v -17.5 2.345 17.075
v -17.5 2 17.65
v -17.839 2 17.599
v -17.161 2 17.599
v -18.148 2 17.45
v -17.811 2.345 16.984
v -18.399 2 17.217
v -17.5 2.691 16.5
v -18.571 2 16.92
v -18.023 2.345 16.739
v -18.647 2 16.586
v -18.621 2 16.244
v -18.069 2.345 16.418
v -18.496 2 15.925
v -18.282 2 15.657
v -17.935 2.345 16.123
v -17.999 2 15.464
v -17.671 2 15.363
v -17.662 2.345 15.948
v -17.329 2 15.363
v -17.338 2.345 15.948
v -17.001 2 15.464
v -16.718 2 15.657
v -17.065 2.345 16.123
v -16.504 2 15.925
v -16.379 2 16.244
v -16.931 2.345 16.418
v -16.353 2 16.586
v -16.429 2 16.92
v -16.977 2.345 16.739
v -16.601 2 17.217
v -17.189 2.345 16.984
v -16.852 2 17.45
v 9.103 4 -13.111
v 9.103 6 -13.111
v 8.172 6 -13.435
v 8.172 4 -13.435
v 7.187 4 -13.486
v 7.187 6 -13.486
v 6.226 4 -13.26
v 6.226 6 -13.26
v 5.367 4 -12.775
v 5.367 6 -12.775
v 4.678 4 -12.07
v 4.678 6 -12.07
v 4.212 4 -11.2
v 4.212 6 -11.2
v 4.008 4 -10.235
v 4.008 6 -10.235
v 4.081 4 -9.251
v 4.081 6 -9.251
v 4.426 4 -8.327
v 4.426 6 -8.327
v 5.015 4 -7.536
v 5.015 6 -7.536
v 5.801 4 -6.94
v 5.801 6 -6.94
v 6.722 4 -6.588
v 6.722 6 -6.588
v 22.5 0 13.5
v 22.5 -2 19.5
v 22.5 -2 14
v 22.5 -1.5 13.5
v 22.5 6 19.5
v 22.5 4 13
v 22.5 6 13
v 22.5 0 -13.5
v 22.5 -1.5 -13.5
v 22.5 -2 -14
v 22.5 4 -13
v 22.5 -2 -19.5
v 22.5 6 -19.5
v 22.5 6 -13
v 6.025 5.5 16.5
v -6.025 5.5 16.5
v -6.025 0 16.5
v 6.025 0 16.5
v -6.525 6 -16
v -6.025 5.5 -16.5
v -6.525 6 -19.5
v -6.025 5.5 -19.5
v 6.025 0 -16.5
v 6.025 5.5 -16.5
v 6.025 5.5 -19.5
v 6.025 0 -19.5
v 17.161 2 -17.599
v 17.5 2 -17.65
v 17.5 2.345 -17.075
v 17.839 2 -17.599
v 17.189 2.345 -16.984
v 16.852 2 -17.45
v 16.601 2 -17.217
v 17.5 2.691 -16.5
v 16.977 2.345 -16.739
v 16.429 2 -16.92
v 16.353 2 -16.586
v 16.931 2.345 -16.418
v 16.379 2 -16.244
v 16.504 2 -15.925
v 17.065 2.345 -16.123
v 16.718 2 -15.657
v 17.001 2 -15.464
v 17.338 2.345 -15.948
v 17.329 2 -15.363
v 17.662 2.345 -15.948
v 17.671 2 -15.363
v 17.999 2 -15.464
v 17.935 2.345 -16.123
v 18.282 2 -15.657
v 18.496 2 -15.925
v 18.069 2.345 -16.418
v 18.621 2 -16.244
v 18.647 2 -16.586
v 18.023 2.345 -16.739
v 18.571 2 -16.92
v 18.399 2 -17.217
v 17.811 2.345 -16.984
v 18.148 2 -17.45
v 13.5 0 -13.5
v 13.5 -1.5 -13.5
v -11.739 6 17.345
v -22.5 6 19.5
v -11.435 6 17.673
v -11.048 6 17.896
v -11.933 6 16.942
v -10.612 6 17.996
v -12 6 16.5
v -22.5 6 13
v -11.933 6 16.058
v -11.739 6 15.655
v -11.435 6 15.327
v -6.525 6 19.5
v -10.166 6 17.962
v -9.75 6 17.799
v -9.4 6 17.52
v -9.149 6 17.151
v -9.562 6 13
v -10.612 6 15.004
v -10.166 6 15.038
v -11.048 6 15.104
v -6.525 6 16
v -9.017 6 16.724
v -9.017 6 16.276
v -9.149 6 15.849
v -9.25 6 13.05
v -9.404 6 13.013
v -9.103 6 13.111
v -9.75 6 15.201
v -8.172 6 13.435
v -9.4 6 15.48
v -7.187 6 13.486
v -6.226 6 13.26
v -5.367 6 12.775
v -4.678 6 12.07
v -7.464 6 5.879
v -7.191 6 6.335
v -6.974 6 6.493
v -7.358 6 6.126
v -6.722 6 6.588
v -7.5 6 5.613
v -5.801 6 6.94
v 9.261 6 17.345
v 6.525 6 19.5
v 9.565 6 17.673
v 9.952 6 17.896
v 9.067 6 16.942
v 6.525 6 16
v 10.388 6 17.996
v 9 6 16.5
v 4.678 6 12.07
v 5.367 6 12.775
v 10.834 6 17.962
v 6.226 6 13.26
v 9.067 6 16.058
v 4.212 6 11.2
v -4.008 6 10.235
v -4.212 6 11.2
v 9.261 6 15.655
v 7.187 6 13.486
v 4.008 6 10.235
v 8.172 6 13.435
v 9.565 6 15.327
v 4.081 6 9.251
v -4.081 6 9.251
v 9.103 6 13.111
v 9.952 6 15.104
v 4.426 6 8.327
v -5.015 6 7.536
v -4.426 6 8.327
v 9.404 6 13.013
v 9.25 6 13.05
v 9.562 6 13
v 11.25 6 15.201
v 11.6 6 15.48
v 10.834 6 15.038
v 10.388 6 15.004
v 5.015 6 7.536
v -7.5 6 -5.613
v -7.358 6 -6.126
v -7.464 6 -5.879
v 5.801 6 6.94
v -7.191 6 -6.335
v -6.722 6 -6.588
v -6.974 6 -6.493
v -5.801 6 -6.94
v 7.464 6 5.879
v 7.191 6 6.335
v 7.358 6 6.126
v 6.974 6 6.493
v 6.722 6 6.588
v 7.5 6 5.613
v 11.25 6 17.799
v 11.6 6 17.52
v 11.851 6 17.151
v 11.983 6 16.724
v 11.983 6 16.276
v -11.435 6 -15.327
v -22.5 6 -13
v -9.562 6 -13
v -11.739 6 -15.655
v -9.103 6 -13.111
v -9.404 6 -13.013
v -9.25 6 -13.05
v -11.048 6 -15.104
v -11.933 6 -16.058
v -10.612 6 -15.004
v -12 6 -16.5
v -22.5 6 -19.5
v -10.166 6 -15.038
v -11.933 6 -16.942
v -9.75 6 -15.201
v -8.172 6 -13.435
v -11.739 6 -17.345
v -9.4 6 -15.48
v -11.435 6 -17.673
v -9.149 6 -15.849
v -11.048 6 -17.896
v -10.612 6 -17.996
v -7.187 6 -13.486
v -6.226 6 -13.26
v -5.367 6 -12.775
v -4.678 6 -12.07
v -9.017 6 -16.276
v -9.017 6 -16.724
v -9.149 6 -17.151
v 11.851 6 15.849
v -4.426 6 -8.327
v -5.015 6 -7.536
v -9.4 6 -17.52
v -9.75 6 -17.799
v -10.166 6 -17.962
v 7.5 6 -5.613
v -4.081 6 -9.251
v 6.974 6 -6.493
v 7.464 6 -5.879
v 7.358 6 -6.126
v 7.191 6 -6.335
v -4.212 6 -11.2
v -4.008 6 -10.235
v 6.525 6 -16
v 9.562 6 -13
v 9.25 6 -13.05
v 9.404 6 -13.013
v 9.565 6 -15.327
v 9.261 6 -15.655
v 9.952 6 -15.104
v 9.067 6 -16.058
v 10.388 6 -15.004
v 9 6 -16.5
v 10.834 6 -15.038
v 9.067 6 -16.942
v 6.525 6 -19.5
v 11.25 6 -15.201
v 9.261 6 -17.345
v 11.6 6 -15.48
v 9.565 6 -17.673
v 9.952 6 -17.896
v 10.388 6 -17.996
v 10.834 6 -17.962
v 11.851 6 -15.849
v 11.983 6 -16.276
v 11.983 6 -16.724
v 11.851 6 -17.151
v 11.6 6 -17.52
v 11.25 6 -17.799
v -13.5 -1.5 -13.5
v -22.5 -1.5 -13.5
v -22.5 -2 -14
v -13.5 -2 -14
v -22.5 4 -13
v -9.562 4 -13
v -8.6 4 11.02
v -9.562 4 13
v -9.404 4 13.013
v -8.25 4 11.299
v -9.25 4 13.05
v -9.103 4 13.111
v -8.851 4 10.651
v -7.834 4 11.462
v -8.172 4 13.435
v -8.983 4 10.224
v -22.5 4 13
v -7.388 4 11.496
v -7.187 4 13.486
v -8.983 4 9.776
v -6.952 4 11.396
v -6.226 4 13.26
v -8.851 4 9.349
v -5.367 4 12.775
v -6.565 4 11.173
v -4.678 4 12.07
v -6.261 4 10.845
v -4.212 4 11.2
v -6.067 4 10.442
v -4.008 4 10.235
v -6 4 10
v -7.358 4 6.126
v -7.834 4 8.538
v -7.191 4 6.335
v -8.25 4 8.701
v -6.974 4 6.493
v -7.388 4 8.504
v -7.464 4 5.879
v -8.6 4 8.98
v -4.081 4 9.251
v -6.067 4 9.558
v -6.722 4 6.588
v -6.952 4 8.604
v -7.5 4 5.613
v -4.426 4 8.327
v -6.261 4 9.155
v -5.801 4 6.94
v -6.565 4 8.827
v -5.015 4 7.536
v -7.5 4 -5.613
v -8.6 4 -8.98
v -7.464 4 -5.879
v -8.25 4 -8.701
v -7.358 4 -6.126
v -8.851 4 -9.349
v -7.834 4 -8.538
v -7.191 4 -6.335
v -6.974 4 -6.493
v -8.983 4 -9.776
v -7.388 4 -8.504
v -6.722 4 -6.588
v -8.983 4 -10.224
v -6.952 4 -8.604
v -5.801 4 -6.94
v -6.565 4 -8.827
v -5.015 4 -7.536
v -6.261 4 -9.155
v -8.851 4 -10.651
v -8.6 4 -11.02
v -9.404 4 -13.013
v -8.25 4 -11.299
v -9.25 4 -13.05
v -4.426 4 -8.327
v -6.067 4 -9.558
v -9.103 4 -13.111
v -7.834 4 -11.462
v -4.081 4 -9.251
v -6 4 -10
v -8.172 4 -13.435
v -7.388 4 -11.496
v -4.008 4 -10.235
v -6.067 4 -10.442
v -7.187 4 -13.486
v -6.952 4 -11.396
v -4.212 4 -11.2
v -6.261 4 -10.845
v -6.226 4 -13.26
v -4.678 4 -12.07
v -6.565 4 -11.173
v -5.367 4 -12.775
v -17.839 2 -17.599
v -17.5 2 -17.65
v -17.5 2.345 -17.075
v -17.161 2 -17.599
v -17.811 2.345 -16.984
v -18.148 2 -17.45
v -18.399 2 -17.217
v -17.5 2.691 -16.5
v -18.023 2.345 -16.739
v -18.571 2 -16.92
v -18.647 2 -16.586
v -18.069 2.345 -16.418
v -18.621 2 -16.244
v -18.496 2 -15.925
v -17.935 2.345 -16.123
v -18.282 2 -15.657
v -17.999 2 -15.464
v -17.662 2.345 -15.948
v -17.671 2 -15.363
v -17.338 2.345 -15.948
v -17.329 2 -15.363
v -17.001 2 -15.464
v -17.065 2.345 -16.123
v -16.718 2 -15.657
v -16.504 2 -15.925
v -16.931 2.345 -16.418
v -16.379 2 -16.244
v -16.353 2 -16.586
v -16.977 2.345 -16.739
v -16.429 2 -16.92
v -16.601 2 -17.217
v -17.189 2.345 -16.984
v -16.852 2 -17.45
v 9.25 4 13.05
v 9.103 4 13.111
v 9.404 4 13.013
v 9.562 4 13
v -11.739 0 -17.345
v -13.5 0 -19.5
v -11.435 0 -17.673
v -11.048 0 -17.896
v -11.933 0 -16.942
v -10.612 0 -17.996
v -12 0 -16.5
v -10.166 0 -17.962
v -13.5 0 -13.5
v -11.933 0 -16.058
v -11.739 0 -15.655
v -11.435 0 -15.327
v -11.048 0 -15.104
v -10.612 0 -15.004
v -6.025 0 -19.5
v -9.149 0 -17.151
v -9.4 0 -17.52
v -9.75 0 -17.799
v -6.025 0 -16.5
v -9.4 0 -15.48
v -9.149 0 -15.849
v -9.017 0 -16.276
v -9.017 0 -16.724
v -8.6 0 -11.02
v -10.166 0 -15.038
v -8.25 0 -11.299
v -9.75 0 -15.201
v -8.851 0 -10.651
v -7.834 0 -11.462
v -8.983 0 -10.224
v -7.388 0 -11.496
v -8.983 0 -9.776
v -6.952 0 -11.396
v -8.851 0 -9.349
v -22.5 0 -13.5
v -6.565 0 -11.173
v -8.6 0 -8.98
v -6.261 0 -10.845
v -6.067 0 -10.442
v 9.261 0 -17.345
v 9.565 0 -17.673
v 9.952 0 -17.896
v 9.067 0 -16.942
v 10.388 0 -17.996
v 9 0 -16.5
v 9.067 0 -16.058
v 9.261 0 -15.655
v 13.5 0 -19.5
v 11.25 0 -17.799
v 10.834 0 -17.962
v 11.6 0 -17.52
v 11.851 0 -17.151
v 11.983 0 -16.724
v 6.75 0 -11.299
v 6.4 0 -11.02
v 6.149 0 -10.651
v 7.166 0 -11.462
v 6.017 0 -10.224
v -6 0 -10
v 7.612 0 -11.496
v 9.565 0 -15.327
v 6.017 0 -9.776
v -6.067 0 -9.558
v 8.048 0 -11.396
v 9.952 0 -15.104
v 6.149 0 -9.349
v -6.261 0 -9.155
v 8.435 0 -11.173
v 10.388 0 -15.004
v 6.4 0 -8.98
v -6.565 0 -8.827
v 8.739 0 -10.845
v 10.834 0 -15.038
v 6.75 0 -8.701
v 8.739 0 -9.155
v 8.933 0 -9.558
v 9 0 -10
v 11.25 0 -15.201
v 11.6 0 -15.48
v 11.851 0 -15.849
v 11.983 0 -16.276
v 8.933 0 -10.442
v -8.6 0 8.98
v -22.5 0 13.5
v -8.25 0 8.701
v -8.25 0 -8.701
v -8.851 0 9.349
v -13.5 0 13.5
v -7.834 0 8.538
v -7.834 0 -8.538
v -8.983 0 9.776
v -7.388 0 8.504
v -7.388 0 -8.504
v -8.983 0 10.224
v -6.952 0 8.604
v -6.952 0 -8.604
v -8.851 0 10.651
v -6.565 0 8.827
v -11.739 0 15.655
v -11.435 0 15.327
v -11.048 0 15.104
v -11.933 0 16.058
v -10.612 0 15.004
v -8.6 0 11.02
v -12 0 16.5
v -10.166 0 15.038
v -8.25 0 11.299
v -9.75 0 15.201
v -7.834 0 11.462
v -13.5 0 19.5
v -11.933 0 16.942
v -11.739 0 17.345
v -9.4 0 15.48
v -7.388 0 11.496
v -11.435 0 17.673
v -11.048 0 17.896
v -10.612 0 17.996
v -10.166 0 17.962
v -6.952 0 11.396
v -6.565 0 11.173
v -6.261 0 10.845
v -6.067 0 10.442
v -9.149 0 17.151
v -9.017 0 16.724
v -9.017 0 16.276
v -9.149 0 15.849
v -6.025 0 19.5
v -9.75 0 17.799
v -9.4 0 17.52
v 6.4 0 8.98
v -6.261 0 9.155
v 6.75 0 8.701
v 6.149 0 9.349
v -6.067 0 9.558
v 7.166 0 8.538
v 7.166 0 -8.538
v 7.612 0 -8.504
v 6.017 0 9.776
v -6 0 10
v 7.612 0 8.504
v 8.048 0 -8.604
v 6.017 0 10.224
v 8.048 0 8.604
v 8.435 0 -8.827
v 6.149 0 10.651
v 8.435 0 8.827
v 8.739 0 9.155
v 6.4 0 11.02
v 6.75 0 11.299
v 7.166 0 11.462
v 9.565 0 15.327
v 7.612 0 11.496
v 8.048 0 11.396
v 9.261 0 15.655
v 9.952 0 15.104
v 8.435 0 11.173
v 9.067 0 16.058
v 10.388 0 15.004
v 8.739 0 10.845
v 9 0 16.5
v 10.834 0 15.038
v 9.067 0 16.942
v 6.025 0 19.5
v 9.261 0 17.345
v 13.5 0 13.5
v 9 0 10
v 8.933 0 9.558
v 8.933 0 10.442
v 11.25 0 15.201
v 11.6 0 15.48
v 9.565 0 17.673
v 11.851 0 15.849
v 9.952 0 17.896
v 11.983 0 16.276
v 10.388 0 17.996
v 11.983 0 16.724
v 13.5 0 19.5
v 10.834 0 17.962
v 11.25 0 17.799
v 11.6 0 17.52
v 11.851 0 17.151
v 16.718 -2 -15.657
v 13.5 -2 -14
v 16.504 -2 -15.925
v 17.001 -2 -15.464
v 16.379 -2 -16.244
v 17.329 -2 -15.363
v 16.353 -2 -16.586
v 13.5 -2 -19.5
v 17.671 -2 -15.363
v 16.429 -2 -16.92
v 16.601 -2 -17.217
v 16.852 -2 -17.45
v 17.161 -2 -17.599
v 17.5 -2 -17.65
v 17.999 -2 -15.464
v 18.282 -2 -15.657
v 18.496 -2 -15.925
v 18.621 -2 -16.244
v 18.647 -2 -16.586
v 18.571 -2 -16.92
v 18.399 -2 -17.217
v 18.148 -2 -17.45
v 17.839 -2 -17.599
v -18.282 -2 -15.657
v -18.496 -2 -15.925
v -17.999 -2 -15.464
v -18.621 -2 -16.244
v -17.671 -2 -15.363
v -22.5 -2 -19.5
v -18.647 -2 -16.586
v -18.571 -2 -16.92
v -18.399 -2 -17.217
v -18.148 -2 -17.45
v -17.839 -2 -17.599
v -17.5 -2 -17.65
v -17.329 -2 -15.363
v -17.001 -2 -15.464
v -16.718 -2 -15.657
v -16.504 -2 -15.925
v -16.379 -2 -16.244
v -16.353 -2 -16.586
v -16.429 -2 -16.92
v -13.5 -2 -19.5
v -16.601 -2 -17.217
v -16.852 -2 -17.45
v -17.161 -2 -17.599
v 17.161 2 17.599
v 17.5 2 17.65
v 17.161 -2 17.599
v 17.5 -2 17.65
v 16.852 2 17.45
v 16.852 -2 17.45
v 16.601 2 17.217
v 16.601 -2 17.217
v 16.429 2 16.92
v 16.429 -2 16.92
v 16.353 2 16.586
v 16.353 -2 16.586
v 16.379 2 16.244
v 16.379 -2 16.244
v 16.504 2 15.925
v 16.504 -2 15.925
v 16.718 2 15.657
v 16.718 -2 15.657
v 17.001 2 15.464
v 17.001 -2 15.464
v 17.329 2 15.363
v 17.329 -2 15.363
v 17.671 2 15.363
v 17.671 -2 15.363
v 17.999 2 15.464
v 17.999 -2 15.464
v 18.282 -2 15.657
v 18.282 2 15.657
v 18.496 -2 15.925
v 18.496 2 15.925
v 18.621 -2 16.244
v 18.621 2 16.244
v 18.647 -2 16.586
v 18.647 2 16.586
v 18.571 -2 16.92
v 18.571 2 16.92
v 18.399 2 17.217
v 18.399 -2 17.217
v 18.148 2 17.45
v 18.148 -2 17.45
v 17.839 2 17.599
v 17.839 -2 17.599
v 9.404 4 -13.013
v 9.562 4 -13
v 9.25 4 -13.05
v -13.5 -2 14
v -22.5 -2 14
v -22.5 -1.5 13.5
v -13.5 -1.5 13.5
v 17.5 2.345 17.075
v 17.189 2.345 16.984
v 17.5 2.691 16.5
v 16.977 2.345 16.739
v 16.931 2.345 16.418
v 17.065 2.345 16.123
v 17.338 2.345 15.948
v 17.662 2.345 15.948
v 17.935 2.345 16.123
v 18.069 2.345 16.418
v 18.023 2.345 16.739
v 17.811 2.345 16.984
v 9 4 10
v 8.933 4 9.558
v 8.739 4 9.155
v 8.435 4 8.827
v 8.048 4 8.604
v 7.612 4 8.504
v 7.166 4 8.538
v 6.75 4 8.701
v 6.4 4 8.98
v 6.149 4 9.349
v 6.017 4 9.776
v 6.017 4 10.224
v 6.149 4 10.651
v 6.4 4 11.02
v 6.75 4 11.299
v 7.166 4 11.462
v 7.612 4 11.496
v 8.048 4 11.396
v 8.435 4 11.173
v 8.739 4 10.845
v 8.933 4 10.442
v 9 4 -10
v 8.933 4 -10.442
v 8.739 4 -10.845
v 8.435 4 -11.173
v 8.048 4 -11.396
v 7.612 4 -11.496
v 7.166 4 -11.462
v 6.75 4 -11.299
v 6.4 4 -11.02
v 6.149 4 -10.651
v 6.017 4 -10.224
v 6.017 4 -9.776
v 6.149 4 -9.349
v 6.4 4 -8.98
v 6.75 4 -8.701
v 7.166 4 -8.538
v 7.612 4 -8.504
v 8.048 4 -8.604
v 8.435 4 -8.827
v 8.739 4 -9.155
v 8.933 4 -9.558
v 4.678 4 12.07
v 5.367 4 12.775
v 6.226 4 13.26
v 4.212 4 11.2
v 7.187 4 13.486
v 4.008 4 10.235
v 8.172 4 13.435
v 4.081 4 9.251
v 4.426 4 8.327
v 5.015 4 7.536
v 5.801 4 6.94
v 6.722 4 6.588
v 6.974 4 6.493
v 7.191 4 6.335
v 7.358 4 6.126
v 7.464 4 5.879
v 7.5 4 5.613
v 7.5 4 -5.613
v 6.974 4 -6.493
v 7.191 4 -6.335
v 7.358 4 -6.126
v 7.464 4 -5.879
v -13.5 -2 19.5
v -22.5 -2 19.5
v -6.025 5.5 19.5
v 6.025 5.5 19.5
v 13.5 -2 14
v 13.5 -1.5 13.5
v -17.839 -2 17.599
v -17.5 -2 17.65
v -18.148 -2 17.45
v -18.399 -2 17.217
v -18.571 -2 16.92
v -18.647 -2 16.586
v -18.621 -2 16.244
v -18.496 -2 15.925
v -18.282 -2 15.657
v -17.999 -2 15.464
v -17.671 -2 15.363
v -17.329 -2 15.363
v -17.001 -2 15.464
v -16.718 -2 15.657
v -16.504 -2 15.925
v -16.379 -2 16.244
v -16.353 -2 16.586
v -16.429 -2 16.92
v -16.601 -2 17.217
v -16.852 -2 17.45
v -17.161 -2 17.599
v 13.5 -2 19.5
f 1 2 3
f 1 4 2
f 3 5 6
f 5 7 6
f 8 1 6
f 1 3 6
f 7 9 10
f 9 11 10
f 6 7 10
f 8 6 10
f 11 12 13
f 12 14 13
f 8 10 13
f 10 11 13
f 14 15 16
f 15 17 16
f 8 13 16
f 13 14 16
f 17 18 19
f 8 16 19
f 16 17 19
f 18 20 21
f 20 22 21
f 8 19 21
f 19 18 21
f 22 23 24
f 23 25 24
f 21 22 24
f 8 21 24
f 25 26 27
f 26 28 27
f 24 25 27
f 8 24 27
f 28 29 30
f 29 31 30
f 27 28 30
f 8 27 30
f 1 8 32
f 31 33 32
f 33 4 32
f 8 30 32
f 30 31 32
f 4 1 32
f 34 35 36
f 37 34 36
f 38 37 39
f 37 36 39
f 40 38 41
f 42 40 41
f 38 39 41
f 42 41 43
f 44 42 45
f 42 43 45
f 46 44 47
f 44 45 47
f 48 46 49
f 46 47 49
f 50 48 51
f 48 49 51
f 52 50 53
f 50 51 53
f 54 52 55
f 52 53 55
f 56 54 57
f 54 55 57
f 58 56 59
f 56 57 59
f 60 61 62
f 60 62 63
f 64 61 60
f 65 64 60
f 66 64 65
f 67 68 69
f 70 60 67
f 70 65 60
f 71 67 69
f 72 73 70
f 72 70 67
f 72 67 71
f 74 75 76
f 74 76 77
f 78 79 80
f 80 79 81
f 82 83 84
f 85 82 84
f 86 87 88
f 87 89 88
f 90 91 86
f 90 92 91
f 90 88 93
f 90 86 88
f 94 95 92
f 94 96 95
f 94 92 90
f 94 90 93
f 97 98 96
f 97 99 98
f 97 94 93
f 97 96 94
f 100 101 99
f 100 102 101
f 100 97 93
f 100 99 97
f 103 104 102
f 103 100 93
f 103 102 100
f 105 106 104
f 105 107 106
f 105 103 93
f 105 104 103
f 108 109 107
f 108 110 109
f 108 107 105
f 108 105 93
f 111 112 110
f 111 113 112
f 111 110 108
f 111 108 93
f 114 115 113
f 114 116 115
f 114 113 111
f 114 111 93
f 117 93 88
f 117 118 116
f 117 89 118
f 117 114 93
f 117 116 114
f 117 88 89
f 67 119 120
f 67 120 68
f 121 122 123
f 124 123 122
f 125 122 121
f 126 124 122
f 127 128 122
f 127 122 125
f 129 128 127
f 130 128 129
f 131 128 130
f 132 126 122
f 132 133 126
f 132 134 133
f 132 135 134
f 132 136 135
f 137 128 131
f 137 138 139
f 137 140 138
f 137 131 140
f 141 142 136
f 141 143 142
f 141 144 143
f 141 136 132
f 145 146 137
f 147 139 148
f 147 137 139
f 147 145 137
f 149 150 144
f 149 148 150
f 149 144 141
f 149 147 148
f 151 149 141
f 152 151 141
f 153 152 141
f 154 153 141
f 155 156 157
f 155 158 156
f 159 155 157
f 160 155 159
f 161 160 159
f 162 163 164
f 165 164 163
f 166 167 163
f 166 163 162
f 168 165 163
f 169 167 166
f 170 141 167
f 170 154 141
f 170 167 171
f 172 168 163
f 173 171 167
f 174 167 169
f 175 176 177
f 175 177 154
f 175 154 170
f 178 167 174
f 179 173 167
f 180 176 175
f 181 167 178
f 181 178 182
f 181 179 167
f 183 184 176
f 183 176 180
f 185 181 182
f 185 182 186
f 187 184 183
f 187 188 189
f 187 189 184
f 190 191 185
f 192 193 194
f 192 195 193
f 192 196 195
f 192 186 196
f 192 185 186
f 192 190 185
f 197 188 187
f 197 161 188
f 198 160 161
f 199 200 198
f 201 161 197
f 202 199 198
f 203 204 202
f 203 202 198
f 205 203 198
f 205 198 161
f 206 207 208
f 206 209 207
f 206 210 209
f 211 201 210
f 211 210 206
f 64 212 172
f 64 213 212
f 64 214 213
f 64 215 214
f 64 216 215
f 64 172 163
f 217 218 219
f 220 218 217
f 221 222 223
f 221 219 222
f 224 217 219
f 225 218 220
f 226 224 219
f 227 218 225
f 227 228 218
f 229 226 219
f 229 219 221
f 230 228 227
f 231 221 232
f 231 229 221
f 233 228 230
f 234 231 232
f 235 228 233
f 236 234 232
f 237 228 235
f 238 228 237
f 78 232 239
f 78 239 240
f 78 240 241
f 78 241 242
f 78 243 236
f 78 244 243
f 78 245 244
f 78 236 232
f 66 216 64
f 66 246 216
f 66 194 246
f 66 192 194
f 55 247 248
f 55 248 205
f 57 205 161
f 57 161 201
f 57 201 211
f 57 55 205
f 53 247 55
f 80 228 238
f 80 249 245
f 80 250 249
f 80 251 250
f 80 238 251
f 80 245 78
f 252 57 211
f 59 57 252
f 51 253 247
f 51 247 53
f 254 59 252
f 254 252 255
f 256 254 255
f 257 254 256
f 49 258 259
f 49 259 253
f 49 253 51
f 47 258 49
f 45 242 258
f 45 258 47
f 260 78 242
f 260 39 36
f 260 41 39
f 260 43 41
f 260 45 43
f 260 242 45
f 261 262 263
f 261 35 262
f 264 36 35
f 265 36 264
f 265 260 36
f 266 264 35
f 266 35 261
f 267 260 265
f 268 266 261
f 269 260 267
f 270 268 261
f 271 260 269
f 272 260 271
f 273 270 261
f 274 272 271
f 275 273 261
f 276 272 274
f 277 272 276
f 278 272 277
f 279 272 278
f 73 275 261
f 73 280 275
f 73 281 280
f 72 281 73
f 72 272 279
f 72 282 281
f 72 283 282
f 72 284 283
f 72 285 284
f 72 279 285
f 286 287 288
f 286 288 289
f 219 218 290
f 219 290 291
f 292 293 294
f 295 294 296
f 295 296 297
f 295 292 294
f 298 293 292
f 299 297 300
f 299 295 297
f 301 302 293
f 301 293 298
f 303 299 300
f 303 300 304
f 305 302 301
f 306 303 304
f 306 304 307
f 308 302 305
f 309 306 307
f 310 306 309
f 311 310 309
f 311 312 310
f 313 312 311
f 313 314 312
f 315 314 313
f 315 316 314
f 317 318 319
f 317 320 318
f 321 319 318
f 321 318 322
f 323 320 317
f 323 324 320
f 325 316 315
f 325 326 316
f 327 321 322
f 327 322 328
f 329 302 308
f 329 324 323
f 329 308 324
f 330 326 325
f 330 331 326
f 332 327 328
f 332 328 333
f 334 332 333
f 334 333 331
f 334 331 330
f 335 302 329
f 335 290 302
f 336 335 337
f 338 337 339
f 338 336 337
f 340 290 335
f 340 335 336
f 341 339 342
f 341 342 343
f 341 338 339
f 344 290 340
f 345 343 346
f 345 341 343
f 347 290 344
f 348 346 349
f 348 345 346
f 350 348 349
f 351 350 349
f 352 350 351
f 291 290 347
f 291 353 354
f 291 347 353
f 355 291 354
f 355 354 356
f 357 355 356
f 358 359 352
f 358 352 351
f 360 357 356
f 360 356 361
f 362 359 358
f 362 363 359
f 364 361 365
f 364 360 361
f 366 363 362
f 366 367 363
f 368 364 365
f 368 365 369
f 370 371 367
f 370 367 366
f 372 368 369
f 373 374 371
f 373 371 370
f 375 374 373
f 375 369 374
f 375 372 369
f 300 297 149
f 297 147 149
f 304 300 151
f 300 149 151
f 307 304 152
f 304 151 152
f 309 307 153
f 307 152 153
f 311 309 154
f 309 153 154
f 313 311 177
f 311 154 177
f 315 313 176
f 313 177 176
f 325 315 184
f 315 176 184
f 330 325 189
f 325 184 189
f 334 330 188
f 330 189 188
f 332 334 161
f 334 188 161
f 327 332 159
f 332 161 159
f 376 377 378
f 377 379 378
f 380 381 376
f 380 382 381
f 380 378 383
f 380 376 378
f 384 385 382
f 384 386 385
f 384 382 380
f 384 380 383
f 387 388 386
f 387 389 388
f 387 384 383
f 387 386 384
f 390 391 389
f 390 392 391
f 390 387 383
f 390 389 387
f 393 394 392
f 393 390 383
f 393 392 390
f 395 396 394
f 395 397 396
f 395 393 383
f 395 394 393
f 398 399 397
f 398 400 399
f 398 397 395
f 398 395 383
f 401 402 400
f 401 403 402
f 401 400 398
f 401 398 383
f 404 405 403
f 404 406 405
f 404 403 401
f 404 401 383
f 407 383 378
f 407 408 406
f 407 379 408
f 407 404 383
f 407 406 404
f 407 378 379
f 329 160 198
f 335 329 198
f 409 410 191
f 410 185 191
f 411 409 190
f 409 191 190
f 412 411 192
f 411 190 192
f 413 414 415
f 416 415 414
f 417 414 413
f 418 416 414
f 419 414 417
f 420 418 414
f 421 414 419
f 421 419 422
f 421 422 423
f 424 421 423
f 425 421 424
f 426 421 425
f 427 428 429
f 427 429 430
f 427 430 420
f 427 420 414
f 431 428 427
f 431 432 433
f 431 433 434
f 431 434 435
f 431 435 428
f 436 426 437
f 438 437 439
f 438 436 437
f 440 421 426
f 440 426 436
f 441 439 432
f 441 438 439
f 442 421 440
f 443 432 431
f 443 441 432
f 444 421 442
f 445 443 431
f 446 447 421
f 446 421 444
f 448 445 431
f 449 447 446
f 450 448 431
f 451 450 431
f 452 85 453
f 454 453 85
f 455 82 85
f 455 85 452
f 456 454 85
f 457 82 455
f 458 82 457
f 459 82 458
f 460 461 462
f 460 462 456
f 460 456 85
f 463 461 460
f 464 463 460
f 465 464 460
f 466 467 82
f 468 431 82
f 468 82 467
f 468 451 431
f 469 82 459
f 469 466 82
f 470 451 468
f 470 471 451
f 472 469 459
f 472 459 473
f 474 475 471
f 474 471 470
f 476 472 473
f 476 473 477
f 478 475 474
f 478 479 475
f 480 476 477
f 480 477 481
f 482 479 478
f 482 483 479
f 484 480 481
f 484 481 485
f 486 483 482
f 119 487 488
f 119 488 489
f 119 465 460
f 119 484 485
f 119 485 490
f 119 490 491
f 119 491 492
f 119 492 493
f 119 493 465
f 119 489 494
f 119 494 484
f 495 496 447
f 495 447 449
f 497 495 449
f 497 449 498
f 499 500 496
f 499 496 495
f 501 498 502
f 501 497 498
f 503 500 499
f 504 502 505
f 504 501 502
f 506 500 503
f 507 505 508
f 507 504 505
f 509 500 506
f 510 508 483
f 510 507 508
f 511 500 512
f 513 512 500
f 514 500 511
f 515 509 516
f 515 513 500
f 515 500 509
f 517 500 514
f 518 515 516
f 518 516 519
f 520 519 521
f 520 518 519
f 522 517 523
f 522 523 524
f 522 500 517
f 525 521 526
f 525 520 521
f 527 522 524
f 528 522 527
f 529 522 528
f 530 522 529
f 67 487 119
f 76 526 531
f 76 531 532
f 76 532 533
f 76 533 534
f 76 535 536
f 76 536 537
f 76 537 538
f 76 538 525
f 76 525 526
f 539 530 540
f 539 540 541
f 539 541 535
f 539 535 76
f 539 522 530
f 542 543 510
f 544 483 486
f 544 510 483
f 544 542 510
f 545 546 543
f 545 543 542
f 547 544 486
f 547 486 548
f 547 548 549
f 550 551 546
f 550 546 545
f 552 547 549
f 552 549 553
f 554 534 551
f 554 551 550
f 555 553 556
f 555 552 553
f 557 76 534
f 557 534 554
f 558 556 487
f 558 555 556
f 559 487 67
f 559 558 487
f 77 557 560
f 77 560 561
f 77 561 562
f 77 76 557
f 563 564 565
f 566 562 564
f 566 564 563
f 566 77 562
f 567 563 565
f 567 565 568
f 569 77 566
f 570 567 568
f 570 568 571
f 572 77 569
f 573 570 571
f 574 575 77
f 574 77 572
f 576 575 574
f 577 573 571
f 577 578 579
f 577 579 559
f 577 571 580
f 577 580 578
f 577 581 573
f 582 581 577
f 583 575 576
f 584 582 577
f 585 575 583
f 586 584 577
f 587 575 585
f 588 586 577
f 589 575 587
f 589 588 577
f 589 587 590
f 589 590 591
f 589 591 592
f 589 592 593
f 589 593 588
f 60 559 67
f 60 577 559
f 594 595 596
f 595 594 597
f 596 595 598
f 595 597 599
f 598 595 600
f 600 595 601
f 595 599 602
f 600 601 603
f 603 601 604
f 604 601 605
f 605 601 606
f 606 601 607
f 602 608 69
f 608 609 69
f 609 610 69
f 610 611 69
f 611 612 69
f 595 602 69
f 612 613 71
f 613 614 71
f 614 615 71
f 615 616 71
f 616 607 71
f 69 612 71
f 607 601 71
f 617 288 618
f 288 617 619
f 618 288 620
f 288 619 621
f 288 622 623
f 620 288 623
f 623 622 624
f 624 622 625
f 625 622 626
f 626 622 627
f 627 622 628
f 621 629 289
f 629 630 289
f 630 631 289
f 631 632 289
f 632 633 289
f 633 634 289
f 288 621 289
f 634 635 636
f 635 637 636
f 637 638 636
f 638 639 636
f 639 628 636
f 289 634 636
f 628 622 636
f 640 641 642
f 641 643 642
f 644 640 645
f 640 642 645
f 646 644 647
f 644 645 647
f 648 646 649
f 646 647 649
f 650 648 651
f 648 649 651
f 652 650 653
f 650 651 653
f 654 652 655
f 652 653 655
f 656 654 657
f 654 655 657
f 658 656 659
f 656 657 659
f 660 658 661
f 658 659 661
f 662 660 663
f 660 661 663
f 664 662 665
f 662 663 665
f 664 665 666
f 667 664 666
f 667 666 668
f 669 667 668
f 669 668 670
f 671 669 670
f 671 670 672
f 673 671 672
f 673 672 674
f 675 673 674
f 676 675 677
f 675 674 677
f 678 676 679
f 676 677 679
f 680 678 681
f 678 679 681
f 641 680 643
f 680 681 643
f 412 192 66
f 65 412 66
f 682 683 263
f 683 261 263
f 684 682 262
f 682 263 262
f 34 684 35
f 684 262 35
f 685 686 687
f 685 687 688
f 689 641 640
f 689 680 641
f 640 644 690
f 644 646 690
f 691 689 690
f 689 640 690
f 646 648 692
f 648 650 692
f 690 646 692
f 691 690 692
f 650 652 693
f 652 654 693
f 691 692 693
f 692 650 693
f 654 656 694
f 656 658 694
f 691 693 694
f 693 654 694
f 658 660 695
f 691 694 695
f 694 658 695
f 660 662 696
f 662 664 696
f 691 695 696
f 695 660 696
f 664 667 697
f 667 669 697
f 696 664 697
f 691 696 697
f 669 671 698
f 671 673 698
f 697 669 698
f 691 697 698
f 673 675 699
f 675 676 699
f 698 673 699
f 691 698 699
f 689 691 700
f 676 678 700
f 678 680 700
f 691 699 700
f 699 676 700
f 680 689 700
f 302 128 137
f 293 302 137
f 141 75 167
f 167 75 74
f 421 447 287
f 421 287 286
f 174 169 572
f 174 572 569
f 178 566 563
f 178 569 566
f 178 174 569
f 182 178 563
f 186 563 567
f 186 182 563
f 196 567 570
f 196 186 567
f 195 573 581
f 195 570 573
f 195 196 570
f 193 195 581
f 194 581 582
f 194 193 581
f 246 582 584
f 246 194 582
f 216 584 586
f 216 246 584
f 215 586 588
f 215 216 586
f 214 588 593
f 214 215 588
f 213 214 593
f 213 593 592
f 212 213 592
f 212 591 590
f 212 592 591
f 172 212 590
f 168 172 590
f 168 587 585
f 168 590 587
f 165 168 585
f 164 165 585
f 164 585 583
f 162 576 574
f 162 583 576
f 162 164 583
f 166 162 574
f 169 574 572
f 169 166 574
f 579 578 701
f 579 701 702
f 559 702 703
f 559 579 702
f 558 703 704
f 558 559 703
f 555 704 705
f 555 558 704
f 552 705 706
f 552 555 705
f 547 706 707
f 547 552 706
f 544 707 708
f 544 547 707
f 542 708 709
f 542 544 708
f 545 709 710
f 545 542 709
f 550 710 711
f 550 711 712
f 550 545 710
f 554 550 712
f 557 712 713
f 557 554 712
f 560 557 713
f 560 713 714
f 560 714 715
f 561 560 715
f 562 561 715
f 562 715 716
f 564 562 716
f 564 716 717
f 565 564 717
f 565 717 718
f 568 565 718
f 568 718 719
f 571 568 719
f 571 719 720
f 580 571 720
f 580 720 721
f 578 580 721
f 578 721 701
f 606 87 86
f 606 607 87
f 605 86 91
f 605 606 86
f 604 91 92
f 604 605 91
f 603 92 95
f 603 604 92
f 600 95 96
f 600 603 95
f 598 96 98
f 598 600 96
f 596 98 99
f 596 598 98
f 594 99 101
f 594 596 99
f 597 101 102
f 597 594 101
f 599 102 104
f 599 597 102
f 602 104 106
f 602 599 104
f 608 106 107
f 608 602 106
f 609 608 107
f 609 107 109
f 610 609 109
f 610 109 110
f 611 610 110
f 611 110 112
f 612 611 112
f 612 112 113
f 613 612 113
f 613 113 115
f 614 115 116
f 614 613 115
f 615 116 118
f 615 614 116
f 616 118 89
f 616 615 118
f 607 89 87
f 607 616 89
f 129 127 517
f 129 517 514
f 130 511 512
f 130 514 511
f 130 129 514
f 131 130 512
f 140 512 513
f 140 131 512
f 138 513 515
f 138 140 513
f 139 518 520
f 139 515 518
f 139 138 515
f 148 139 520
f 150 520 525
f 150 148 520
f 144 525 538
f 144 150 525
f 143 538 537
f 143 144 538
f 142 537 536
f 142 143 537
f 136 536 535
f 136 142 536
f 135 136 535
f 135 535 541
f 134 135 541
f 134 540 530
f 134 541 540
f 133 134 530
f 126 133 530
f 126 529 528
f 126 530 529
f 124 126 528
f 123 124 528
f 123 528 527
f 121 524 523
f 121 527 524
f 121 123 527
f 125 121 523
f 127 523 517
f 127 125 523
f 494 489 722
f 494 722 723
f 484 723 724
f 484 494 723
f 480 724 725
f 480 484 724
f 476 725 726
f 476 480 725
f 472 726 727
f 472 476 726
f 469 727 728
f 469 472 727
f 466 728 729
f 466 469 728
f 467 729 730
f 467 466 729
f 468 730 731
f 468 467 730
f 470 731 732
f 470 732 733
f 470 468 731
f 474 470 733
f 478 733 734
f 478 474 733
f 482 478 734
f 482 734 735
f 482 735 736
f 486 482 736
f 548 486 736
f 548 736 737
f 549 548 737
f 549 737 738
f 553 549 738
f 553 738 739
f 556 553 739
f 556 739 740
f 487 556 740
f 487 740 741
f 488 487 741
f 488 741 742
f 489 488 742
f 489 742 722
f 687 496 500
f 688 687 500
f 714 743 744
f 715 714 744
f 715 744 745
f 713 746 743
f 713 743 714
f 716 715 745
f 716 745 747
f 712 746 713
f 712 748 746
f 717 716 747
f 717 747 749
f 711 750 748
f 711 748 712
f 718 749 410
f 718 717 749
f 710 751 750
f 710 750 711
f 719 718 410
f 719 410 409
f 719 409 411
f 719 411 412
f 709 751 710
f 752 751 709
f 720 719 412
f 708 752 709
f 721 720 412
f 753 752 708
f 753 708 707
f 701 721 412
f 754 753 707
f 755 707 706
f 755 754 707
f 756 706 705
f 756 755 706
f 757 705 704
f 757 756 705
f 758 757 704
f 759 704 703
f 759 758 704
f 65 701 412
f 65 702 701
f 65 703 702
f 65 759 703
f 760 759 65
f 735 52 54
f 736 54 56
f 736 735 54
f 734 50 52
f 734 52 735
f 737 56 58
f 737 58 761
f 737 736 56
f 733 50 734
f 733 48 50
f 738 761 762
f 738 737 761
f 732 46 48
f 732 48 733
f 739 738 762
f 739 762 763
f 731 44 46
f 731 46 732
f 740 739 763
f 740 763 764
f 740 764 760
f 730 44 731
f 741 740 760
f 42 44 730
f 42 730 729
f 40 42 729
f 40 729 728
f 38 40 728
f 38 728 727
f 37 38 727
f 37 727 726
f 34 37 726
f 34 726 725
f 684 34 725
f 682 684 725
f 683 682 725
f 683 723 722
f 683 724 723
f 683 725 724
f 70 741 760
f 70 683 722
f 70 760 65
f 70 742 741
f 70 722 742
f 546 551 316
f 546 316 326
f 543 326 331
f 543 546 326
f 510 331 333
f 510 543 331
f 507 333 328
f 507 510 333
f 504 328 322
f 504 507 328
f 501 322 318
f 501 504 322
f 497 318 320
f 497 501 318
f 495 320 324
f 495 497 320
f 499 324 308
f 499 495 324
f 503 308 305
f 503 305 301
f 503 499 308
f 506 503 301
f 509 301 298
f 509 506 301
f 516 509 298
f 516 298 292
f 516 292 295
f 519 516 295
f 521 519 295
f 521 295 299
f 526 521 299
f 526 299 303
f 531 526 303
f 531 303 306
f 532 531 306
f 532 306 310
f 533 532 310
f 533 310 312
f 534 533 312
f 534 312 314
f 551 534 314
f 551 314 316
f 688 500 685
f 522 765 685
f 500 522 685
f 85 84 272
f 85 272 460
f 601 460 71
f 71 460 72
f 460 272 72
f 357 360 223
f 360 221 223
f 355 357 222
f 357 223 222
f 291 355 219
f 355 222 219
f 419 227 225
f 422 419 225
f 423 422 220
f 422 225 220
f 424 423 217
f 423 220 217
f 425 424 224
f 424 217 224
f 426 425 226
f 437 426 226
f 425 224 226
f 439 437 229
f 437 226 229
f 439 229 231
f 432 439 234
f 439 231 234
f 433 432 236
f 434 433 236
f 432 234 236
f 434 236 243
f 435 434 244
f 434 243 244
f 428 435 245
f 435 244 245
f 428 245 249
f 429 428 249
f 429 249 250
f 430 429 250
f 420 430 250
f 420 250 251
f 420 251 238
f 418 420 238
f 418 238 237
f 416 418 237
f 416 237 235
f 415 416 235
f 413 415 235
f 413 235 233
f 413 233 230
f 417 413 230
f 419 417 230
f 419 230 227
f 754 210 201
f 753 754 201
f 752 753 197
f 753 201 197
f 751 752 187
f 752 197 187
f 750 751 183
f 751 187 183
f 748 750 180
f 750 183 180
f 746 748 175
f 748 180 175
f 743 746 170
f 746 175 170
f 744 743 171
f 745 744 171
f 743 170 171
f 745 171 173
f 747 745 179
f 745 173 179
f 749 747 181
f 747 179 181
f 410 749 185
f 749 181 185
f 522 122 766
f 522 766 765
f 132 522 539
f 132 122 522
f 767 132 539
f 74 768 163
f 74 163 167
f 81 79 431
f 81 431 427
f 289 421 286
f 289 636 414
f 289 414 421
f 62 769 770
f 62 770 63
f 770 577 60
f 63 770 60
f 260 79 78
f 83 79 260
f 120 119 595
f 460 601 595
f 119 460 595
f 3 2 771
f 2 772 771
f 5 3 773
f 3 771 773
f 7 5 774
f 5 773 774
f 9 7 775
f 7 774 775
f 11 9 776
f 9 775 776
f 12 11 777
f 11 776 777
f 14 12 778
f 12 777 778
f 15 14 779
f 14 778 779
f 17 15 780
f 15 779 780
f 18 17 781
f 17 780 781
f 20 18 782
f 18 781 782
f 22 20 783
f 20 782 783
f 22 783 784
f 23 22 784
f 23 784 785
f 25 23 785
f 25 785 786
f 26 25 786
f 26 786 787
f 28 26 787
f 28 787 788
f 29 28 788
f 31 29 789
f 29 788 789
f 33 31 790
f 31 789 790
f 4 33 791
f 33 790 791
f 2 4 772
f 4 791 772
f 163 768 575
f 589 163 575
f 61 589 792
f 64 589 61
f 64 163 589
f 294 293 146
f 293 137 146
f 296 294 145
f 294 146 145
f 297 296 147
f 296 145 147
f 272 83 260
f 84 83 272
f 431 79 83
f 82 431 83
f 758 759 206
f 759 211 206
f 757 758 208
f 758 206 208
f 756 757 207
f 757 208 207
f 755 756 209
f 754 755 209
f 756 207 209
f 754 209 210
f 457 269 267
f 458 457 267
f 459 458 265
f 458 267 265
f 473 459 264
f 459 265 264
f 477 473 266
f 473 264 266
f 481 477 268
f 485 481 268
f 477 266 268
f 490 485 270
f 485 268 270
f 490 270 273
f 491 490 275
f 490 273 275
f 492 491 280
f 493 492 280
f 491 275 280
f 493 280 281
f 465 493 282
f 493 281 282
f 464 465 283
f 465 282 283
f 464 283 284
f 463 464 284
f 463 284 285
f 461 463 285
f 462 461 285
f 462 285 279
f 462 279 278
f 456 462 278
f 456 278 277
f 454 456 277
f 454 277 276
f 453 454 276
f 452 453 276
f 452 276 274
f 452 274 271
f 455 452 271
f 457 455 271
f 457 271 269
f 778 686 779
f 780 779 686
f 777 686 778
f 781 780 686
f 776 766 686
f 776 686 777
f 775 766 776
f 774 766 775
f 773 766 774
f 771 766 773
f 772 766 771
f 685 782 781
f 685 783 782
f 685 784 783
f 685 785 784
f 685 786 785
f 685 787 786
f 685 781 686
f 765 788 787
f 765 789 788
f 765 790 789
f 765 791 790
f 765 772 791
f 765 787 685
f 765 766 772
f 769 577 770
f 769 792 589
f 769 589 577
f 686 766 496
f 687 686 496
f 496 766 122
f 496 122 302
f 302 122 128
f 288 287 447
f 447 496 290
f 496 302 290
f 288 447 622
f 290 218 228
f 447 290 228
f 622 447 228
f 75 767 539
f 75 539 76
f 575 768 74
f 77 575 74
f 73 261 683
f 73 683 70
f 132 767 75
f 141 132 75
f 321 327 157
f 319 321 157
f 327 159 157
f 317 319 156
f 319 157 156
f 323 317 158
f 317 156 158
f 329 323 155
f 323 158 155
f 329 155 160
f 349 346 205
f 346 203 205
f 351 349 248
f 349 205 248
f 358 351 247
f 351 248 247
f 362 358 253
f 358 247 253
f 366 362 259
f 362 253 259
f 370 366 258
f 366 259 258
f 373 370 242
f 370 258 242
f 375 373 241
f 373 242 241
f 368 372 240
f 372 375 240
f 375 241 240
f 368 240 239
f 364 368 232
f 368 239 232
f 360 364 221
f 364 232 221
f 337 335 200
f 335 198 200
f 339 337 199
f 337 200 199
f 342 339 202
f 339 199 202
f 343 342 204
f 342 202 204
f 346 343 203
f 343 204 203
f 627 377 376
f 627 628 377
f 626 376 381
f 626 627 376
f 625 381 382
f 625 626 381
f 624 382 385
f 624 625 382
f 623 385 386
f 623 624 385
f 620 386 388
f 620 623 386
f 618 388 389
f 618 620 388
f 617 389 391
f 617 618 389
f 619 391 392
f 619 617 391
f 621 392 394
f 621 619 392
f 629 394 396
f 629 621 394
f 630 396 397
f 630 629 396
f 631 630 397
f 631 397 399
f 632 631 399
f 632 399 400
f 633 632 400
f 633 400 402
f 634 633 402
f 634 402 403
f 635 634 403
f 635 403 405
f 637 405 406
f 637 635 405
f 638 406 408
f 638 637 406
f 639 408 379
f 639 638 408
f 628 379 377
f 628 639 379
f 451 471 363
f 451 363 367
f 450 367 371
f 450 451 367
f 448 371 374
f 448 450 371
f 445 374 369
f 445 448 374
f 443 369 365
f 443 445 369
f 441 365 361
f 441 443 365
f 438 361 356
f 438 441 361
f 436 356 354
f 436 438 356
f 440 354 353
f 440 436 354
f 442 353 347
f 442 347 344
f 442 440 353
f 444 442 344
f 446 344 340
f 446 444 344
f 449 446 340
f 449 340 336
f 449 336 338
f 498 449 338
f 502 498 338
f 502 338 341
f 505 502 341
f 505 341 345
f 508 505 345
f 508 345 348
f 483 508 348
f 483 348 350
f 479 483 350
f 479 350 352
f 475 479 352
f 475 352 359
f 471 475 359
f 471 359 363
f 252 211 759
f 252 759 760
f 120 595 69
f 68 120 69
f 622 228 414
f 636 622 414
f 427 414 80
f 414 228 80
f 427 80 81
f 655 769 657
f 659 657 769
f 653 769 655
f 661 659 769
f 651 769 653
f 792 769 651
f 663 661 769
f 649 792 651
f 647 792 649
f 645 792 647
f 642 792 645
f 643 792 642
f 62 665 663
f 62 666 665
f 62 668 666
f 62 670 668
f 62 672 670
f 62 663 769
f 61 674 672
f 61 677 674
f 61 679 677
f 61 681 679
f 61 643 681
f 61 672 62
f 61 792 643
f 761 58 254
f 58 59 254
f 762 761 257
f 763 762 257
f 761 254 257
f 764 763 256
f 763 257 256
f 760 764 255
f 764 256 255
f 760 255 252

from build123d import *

# Parameters (mm, degrees)
SKETCH_2_W                = 45
SKETCH_2_H                = 33
SKETCH_2_R                = 1.5
EXTRUDE_1_DEPTH           = 6
SKETCH_3_W                = 45
SKETCH_3_H                = 3
EXTRUDE_2_DEPTH           = 2
SKETCH_4_R                = 3.5
CUT_EXTRUDE_1_DEPTH       = 2
SKETCH_11_W               = 45
SKETCH_11_H               = 3
EXTRUDE_4_DEPTH           = 8
CUT_EXTRUDE_2_REACH       = 10
SKETCH_9_W                = 12.05
SKETCH_9_H                = 3
CHAMFER_1_SIZE            = 0.5
SKETCH_19_W               = 6
SKETCH_19_H               = 6
CUT_EXTRUDE_4_DEPTH       = 2
HOLE_WIZARD_3_0_3_1_D     = 3
HOLE_WIZARD_3_0_3_1_DEPTH = 6.001
CHAMFER_2_SIZE            = 0.5
SKETCH_20_W               = 15
SKETCH_20_H               = 26
CUT_EXTRUDE_5_DEPTH       = 2
FILLET_1_R                = 1
SKETCH_22_W               = 15
SKETCH_22_H               = 6
CUT_EXTRUDE_6_DEPTH       = 2


with BuildPart() as part:
    # 草图2 → 凸台-拉伸1 (new body)
    with BuildSketch(Plane(origin=(0, 0, 0), x_dir=(1, 0, 0), z_dir=(0, 1, 0))):
        Rectangle(SKETCH_2_W, SKETCH_2_H)
        with Locations((-7.5, 10)):
            Circle(SKETCH_2_R, mode=Mode.SUBTRACT)
        with Locations((7.5, 10)):
            Circle(SKETCH_2_R, mode=Mode.SUBTRACT)
        with Locations((-7.5, -10)):
            Circle(SKETCH_2_R, mode=Mode.SUBTRACT)
        with Locations((7.5, -10)):
            Circle(SKETCH_2_R, mode=Mode.SUBTRACT)
    extrude(amount=EXTRUDE_1_DEPTH)

    # 草图3 → 凸台-拉伸2 (add)
    with BuildSketch(Plane.XZ):
        with Locations((0, -15)):
            Rectangle(SKETCH_3_W, SKETCH_3_H)
        with Locations((0, 15)):
            Rectangle(SKETCH_3_W, SKETCH_3_H)
    extrude(amount=EXTRUDE_2_DEPTH)

    # 草图4 → 切除-拉伸1 (cut)
    with BuildSketch(Plane(origin=(0, 6, 0), x_dir=(1, 0, 0), z_dir=(0, 1, 0))):
        with Locations((-7.5, 10)):
            Circle(SKETCH_4_R)
        with Locations((7.5, 10)):
            Circle(SKETCH_4_R)
        with Locations((7.5, -10)):
            Circle(SKETCH_4_R)
        with Locations((-7.5, -10)):
            Circle(SKETCH_4_R)
    extrude(amount=-CUT_EXTRUDE_1_DEPTH, mode=Mode.SUBTRACT)

    # 草图11 → 凸台-拉伸4 (add)
    with BuildSketch(Plane(origin=(0, 6, 0), x_dir=(1, 0, 0), z_dir=(0, 1, 0))):
        with Locations((0, 18)):
            Rectangle(SKETCH_11_W, SKETCH_11_H)
        with Locations((0, -18)):
            Rectangle(SKETCH_11_W, SKETCH_11_H)
    extrude(amount=-EXTRUDE_4_DEPTH)

    # 草图9 → 切除-拉伸2 (cut, up to next)
    with BuildSketch(Plane(origin=(0, 6, 0), x_dir=(1, 0, 0), z_dir=(0, 1, 0)), mode=Mode.PRIVATE) as cut_extrude_2_sk1:
        with Locations((0, 18)):
            Rectangle(SKETCH_9_W, SKETCH_9_H)
    cut_extrude_2_tool1 = extrude(cut_extrude_2_sk1.sketch, amount=-CUT_EXTRUDE_2_REACH, mode=Mode.PRIVATE) & part.part
    add(cut_extrude_2_tool1.solids().sort_by_distance((0, 6, -18))[0], mode=Mode.SUBTRACT)
    # 草图9 → 切除-拉伸2 (cut, up to next)
    with BuildSketch(Plane(origin=(0, 6, 0), x_dir=(1, 0, 0), z_dir=(0, 1, 0)), mode=Mode.PRIVATE) as cut_extrude_2_sk2:
        with Locations((0, -18)):
            Rectangle(SKETCH_9_W, SKETCH_9_H)
    cut_extrude_2_tool2 = extrude(cut_extrude_2_sk2.sketch, amount=-CUT_EXTRUDE_2_REACH, mode=Mode.PRIVATE) & part.part
    add(cut_extrude_2_tool2.solids().sort_by_distance((0, 6, 18))[0], mode=Mode.SUBTRACT)

    # 倒角1
    chamfer_1_edges = [part.edges().sort_by_distance(p)[0] for p in [
        (-6.025, 6, -18),
        (0, 6, -16.5),
        (6.025, 6, -18),
        (6.025, 6, 18),
        (0, 6, 16.5),
        (-6.025, 6, 18),
    ]]
    chamfer(chamfer_1_edges, length=CHAMFER_1_SIZE)

    # 草图15 → M3 螺纹孔2 (revolve, cut)
    with BuildSketch(Plane(origin=(-17.5, -2, -16.5), x_dir=(0, 0, -1), z_dir=(1, 0, 0))):
        Polygon((0, 0), (0, 4.690989712), (1.15, 4), (1.15, 0), align=None)
    hole_wizard_m3_2 = revolve(axis=Axis((-17.5, -8.35, -16.5), (0, 1, 0)), mode=Mode.SUBTRACT)

    # 草图17 → M3 螺纹孔3 (revolve, cut)
    with BuildSketch(Plane(origin=(17.5, -2, -16.5), x_dir=(0, 0, -1), z_dir=(1, 0, 0))):
        Polygon((0, 0), (0, 4.690989712), (1.15, 4), (1.15, 0), align=None)
    hole_wizard_m3_3 = revolve(axis=Axis((17.5, -8.35, -16.5), (0, 1, 0)), mode=Mode.SUBTRACT)

    # 草图19 → 切除-拉伸4 (cut)
    with BuildSketch(Plane.XZ.offset(2)):
        with Locations((-10.5, -16.5)):
            Rectangle(SKETCH_19_W, SKETCH_19_H)
        with Locations((10.5, -16.5)):
            Rectangle(SKETCH_19_W, SKETCH_19_H)
    cut_extrude_4 = extrude(amount=-CUT_EXTRUDE_4_DEPTH, mode=Mode.SUBTRACT)

    # Ø3.0 (3) 直径孔1
    with Locations(Plane.XZ):
        with Locations((-10.5, -16.5), (10.5, -16.5)):
            hole_wizard_3_0_3_1 = Hole(HOLE_WIZARD_3_0_3_1_D / 2, depth=HOLE_WIZARD_3_0_3_1_DEPTH)

    # 镜向1: M3 螺纹孔2, M3 螺纹孔3, 切除-拉伸4, Ø3.0 (3) 直径孔1 across plane
    add(hole_wizard_m3_2.mirror(Plane.XY), mode=Mode.SUBTRACT)
    add(hole_wizard_m3_3.mirror(Plane.XY), mode=Mode.SUBTRACT)
    add(cut_extrude_4.mirror(Plane.XY), mode=Mode.SUBTRACT)
    add(hole_wizard_3_0_3_1.mirror(Plane.XY), mode=Mode.SUBTRACT)

    # 倒角2
    chamfer_2_edges = [part.edges().sort_by_distance(p)[0] for p in [
        (-18, -2, -13.5),
        (0, -2, -13.5),
        (0, -2, 13.5),
        (18, -2, 13.5),
        (18, -2, -13.5),
        (-18, -2, 13.5),
    ]]
    chamfer(chamfer_2_edges, length=CHAMFER_2_SIZE)

    # 草图20 → 切除-拉伸5 (cut)
    with BuildSketch(Plane(origin=(0, 6, 0), x_dir=(1, 0, 0), z_dir=(0, 1, 0))):
        with Locations((15, 0)):
            Rectangle(SKETCH_20_W, SKETCH_20_H)
        with Locations((-15, 0)):
            Rectangle(SKETCH_20_W, SKETCH_20_H)
    extrude(amount=-CUT_EXTRUDE_5_DEPTH, mode=Mode.SUBTRACT)

    # 圆角1
    fillet_1_edges = [part.edges().sort_by_distance(p)[0] for p in [
        (9.302775638, 5, 13),
        (7.5, 5, 6.5),
        (7.5, 5, -6.5),
        (9.302775638, 5, -13),
        (-9.302775638, 5, -13),
        (-7.5, 5, -6.5),
        (-7.5, 5, 6.5),
        (-9.302775638, 5, 13),
    ]]
    fillet(fillet_1_edges, radius=FILLET_1_R)

    # 草图22 → 切除-拉伸6 (cut)
    with BuildSketch(Plane.XZ.offset(2)):
        with Locations((0, 16.5)):
            Rectangle(SKETCH_22_W, SKETCH_22_H)
        with Locations((0, -16.5)):
            Rectangle(SKETCH_22_W, SKETCH_22_H)
    extrude(amount=-CUT_EXTRUDE_6_DEPTH, mode=Mode.SUBTRACT)


solid = part.part
